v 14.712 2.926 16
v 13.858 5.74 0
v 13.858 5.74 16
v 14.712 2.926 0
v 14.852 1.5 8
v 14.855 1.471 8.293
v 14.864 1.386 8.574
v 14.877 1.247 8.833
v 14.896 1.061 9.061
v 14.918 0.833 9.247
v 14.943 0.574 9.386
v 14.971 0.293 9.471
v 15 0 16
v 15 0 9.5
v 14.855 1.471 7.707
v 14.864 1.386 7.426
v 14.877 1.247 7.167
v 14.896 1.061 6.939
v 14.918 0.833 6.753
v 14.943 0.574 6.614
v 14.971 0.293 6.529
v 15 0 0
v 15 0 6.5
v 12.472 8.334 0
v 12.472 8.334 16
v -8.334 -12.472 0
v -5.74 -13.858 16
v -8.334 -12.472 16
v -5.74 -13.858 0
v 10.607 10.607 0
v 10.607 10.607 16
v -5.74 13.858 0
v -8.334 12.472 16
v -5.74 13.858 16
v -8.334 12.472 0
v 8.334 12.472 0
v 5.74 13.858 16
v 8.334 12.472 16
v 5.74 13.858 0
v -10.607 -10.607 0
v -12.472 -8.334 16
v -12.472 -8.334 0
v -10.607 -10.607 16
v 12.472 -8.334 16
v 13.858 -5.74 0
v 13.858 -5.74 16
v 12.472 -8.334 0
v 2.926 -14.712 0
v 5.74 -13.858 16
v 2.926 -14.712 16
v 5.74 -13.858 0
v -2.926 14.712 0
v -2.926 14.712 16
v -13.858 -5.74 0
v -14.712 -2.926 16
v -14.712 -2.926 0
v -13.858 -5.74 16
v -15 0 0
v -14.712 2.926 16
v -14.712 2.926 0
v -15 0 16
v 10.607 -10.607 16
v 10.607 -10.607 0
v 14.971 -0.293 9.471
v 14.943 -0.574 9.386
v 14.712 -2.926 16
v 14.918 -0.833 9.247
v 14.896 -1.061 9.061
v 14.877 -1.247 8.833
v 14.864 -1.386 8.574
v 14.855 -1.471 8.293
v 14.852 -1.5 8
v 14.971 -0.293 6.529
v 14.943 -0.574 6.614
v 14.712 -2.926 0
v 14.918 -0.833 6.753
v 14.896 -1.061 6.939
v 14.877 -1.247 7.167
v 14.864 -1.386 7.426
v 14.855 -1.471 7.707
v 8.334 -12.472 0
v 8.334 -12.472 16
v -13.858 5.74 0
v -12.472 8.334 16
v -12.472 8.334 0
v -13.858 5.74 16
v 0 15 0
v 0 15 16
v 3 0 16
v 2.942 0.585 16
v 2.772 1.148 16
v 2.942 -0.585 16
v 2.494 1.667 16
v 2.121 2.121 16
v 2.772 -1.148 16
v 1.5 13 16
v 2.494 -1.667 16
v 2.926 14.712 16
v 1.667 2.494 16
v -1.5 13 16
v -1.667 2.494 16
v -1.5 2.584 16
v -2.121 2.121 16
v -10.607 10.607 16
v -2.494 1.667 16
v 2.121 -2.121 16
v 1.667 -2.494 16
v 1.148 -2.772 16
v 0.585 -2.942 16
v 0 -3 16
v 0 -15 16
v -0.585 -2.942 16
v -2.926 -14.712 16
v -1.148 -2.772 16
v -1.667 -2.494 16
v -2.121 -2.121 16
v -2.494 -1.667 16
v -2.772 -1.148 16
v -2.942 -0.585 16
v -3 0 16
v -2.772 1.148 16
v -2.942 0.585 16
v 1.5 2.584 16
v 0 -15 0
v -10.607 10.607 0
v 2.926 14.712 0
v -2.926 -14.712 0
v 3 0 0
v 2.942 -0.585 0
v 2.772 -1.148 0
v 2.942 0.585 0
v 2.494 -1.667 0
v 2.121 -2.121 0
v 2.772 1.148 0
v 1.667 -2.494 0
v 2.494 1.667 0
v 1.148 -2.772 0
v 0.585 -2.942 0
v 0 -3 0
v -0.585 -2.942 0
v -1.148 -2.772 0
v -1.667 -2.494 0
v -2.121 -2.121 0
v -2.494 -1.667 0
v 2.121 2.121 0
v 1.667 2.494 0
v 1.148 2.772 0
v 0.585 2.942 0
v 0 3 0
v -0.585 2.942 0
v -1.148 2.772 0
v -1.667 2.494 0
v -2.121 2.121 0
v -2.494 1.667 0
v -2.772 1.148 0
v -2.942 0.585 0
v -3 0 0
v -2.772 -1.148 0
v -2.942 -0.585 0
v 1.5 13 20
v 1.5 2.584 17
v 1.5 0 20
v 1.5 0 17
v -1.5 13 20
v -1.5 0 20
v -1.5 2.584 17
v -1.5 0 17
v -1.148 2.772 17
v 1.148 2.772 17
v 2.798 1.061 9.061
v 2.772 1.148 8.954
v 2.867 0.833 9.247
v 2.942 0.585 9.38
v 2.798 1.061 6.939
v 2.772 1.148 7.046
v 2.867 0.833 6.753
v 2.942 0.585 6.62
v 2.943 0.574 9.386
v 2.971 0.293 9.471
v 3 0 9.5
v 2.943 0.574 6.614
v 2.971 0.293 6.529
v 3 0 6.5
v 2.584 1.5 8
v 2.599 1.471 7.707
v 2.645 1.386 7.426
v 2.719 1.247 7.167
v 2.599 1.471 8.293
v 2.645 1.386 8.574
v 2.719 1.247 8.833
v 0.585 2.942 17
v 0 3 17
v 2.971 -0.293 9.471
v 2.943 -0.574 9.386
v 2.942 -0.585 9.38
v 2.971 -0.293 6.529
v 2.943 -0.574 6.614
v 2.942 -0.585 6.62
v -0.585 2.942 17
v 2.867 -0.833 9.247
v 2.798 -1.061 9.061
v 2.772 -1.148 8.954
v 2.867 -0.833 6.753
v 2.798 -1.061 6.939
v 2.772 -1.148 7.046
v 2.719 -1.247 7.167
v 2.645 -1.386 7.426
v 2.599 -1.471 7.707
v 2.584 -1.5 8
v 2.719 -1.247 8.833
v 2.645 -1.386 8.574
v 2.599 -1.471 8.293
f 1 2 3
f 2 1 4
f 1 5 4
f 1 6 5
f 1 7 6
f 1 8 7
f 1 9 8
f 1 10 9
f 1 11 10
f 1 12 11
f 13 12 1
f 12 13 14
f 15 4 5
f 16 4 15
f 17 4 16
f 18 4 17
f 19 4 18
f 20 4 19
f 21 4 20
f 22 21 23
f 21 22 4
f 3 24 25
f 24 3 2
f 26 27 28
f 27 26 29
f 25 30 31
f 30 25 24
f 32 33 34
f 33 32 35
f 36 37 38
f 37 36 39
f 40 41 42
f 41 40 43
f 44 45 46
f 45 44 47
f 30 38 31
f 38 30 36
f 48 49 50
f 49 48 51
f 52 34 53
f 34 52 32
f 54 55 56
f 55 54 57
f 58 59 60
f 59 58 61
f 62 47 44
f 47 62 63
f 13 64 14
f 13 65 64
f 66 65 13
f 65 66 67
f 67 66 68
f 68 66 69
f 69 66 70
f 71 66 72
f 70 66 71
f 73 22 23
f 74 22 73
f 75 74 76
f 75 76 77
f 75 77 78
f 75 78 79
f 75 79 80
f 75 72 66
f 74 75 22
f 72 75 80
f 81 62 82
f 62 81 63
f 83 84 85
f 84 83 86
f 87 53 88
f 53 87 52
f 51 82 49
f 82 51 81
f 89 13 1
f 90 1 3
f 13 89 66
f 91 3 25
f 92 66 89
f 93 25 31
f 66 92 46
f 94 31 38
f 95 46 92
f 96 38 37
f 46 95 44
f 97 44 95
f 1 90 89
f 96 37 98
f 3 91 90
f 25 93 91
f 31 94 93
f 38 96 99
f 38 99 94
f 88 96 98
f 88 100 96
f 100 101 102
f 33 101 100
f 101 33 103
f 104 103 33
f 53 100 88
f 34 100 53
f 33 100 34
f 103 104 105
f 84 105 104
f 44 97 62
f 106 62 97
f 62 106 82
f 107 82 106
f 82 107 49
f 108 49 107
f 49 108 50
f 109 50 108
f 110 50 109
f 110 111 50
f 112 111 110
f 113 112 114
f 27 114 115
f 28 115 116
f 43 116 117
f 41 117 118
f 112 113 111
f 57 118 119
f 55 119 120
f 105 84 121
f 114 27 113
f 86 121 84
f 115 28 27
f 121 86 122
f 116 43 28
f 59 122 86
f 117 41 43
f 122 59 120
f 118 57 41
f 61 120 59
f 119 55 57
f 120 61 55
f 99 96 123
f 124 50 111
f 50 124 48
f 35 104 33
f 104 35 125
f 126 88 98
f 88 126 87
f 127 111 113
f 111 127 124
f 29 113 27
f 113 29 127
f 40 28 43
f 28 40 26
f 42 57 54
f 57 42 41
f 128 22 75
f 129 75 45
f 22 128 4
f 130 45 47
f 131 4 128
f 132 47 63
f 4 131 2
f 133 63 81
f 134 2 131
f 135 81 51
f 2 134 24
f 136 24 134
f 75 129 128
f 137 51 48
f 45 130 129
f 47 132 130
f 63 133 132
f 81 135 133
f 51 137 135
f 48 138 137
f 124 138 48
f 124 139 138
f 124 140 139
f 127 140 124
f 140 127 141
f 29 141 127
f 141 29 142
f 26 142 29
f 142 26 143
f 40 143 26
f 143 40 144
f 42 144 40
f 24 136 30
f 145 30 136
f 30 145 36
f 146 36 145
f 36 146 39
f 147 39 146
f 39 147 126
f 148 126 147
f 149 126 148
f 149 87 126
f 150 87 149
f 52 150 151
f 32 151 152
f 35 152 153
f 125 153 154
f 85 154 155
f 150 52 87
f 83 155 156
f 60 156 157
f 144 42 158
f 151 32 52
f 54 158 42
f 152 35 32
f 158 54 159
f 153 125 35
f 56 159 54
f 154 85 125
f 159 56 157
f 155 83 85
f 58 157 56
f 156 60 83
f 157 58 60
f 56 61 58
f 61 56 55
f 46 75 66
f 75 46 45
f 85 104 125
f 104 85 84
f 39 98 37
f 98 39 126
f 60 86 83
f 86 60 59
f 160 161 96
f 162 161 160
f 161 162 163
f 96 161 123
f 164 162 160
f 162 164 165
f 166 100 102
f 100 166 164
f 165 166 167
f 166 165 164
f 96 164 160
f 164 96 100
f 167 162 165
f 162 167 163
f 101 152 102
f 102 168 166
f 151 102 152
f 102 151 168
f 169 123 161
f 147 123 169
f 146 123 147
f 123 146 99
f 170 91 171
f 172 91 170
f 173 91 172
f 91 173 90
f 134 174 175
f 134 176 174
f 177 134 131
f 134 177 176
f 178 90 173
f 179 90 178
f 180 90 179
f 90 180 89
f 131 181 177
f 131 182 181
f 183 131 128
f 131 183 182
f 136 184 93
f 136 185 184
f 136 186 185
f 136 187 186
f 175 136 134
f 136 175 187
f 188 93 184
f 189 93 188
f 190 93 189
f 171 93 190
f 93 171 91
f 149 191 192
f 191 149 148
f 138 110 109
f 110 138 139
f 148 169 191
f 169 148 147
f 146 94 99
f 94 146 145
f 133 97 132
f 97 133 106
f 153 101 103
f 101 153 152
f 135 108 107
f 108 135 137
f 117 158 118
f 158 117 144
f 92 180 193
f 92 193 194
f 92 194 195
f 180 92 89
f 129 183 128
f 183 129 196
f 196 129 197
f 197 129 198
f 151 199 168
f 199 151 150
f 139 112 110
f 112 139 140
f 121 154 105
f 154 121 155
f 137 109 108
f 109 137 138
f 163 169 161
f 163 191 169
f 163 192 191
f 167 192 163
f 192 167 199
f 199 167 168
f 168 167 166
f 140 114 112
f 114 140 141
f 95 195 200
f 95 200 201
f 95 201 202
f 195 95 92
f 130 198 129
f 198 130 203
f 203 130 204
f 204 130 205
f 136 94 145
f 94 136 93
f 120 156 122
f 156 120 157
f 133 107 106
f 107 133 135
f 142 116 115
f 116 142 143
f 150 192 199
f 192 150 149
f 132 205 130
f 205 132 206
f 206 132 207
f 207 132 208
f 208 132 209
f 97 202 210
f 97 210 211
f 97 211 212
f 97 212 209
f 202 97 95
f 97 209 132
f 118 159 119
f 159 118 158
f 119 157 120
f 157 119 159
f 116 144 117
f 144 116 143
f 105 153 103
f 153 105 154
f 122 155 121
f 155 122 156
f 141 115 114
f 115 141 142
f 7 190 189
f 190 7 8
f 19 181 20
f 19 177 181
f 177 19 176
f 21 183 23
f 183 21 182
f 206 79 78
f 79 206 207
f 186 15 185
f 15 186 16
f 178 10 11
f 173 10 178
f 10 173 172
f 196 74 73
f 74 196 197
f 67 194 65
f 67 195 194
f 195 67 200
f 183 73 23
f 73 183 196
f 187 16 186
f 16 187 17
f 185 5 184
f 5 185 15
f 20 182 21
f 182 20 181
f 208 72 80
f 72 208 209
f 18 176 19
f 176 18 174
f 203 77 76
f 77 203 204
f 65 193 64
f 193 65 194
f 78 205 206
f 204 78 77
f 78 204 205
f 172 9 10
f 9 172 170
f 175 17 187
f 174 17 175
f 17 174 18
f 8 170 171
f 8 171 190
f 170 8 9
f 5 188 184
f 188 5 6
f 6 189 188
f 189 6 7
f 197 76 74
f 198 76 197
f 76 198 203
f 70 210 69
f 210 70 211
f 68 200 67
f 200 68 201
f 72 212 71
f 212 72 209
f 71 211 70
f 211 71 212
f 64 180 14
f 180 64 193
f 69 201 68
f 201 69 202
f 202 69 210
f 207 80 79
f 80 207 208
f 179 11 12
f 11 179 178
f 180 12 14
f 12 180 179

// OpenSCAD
$fn = 32;

// ----------------------------------------------------------------------
// Control knob: pointer knob
// ----------------------------------------------------------------------

// --- parameters (mm) ---
rib_w = 3;                // pointer rib width
rib_h = 5;                // pointer rib height
knob_d = 30;              // knob body diameter
knob_h = 16;              // knob body height
bore_d = 6;               // shaft bore diameter
set_d = 3;                // set screw bore diameter
fit_tol = 0.05;           // tolerance for press fits, mm
free_tol = 0.2;           // tolerance for clearance fits, mm

rib_poke = rib_h - 1;  // rib height above the top
total_h = knob_h + rib_h - 1;  // overall height

difference() {
  union() {
    cylinder(h = knob_h, d = knob_d);
    translate([-rib_w / 2, 0, knob_h - 1])
      cube([rib_w, knob_d / 2 - 2, rib_h]);
  }
  translate([0, 0, -1]) cylinder(h = knob_h + 2, d = bore_d);
  translate([-1, 0, knob_h / 2]) rotate([0, 90, 0])
    cylinder(h = knob_d / 2 + bore_d / 2 + 2, d = set_d);}
